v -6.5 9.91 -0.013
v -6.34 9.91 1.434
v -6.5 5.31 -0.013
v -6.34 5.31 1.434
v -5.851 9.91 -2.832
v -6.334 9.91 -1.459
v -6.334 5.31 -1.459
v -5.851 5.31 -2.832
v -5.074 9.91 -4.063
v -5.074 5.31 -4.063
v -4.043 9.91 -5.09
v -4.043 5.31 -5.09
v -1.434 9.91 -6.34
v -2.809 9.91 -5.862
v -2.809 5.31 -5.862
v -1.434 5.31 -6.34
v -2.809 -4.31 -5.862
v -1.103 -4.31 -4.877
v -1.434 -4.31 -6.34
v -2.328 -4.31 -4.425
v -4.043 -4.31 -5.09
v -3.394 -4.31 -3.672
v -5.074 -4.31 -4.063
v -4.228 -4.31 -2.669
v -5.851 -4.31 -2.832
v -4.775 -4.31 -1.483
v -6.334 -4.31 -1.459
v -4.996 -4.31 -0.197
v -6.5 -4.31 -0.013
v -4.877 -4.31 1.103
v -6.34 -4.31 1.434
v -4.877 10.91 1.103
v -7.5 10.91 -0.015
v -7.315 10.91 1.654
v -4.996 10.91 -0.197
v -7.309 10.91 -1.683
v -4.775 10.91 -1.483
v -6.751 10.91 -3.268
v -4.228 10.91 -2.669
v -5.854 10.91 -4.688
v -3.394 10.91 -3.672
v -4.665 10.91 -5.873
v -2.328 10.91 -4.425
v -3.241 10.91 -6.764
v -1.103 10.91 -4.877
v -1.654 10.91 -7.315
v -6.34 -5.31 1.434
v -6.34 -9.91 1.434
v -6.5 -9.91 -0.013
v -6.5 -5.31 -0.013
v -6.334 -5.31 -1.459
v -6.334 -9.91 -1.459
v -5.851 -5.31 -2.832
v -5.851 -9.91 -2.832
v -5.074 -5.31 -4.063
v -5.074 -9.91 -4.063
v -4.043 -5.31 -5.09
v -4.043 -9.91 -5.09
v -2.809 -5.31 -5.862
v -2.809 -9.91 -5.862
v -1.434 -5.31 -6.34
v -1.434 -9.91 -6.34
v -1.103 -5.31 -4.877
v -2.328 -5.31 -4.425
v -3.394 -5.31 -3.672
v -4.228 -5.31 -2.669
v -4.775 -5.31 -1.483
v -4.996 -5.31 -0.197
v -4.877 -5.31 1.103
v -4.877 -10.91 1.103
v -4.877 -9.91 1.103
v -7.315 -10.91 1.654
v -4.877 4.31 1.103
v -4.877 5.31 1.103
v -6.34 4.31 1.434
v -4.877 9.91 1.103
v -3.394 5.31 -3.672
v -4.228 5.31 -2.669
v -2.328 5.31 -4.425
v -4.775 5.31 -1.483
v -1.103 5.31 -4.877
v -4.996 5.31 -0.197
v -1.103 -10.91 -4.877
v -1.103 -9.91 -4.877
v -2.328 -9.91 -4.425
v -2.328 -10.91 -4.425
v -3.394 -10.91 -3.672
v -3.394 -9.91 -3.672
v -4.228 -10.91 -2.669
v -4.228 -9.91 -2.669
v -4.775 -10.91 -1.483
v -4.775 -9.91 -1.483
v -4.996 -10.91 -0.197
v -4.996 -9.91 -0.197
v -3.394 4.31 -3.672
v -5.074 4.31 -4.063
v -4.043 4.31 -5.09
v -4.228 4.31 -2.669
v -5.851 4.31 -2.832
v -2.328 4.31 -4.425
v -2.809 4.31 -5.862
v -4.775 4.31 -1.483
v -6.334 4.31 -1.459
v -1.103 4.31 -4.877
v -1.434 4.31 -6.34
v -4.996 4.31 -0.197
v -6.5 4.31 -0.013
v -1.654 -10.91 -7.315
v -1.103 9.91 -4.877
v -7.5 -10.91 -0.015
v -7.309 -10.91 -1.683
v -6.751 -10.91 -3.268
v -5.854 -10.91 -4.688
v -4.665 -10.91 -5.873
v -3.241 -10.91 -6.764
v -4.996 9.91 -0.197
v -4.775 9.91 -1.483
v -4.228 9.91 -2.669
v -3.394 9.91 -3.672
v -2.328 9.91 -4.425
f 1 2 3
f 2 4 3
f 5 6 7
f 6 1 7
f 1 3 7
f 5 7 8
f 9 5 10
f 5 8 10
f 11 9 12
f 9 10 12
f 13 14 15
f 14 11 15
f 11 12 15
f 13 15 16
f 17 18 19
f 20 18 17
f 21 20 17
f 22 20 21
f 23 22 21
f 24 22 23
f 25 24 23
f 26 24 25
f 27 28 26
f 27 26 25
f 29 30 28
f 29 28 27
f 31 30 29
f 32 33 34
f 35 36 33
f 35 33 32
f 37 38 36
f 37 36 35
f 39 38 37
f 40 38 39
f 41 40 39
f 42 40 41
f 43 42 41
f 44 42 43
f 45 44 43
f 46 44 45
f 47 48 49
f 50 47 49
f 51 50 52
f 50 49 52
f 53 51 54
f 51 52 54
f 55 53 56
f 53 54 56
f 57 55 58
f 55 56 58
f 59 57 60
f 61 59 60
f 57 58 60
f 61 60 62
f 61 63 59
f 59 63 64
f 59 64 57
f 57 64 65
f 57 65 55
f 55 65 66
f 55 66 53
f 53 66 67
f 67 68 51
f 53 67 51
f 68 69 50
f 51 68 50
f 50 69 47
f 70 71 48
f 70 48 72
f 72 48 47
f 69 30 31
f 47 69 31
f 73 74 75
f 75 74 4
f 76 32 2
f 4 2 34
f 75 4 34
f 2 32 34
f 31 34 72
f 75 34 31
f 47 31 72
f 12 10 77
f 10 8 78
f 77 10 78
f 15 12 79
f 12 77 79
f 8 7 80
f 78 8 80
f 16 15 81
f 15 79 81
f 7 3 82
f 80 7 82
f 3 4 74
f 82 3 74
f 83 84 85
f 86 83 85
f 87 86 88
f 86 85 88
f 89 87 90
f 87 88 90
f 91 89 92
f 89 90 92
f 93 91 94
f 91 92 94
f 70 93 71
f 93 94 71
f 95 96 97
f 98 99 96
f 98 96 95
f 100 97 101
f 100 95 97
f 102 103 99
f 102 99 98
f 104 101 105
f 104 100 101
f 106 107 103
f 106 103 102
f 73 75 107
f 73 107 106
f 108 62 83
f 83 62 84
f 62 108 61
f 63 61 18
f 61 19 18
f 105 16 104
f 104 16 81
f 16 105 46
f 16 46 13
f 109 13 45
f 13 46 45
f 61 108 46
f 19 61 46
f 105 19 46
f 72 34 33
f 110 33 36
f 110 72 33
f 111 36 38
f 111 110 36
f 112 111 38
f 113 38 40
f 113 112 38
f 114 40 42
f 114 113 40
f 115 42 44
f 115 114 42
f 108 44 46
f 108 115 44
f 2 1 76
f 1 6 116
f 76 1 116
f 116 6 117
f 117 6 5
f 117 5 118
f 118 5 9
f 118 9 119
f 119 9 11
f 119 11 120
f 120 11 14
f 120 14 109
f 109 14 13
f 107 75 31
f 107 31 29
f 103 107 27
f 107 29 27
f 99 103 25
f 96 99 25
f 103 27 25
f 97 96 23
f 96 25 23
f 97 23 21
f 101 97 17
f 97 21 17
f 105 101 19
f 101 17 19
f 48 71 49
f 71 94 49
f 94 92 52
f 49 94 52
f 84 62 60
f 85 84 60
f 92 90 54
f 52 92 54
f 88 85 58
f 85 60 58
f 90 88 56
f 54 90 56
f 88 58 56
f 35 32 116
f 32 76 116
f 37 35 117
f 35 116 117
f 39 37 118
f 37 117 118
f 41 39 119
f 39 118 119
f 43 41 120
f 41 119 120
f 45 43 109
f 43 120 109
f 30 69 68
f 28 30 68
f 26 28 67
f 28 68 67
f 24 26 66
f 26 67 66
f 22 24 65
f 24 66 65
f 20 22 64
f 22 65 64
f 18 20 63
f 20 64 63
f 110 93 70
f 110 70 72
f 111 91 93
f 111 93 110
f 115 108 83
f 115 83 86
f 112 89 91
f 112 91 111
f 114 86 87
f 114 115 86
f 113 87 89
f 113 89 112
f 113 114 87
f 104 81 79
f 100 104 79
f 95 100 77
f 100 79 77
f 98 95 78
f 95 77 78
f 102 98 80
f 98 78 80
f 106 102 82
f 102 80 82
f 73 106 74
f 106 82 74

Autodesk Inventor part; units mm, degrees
ref_plane "YZ Plane" through (0, 0, 0) normal (1, 0, 0) x (0, 1, 0)
ref_plane "XZ Plane" through (0, 0, 0) normal (0, 1, 0) x (-1, 0, 0)
ref_plane "XY Plane" through (0, 0, 0) normal (0, 0, 1) x (1, 0, 0)
sketch "Sketch1" plane through (0, 0, 0) normal (0, 1, 0) x (-1, 0, 0)
  arc A0 (1.6544, -7.3153) -> (7.3153, 1.6544) centre (0, 0) ccw
  arc A1 (1.4338, -6.3399) -> (6.3399, 1.4338) centre (0, 0) ccw
  line L0 (7.3153, 1.6544) -> (6.3399, 1.4338)
  line L1 (1.4338, -6.3399) -> (1.6544, -7.3153)
  dimension "d0" = 7.5
  dimension "d1" = 1
  dimension "d4" = 90
extrude "Extrusion1" add sketch "Sketch1" along normal mid plane 19.821
sketch "Sketch2" plane through (0, 9.9105, 0) normal (0, 1, 0) x (1, 0, 0)
  arc A0 (-1.6544, 7.3153) -> (-7.3153, -1.6544) centre (0, 0) ccw projected
  arc A1 (-1.1029, 4.8768) -> (-4.8768, -1.1029) centre (0, 0) ccw
  line L0 (-7.3153, -1.6544) -> (-4.8768, -1.1029)
  line L1 (-1.1029, 4.8768) -> (-1.6544, 7.3153)
  line L2 (-7.3153, -1.6544) -> (-6.3399, -1.4338) projected
  line L3 (-1.4338, 6.3399) -> (-1.6544, 7.3153) projected
  dimension "d9" = 2.5
extrude "Extrusion2" add sketch "Sketch2" along normal blind 1
mirror "Mirror1" about plane through (0, 0, 0) normal (0, 1, 0) of "Extrusion2"
ref_plane "Work Plane2" through (0, 5.3105, 0) normal (0, -1, 0) x (1, 0, 0)
sketch "Sketch3" plane through (0, 5.3105, 0) normal (0, -1, 0) x (1, 0, 0)
  arc A0 (-7.3153, 1.6544) -> (-1.6544, -7.3153) centre (0, 0) ccw projected
  line L0 (-7.3153, 1.6544) -> (-4.8768, 1.1029) projected
  arc A1 (-4.8768, 1.1029) -> (-1.1029, -4.8768) centre (0, 0) ccw projected
  line L1 (-1.1029, -4.8768) -> (-1.6544, -7.3153) projected
extrude "Extrusion3" add sketch "Sketch3" along normal blind 1
mirror "Mirror2" about plane through (0, 0, 0) normal (0, 1, 0) of "Extrusion3"
ref_plane "Work Plane3" through (-6.3399, 12.512, 1.4338) normal (-0.8457, 0, -0.5337) x (0.5337, 0, -0.8457)
sketch "Sketch4" plane through (-14.3948, 12.512, -3.6499) normal (-0.8457, 0, -0.5337) x (0.5337, 0, -0.8457)
  line L0 (3.7075, 16.0789) -> (7.5195, 16.0789) construction
  line L1 (7.5195, 16.0789) -> (7.5195, 13.4854) construction
  line L2 (7.5195, 13.4854) -> (3.7075, 13.4854) construction
  line L3 (3.7075, 13.4854) -> (3.7075, 16.0789) construction
  point P0 (4.5962, 12.512)
ref_plane "Work Plane1" through (0, 0, 0) normal (0, 1, 0) x (-1, 0, 0)
properties part number "circular_tether"
